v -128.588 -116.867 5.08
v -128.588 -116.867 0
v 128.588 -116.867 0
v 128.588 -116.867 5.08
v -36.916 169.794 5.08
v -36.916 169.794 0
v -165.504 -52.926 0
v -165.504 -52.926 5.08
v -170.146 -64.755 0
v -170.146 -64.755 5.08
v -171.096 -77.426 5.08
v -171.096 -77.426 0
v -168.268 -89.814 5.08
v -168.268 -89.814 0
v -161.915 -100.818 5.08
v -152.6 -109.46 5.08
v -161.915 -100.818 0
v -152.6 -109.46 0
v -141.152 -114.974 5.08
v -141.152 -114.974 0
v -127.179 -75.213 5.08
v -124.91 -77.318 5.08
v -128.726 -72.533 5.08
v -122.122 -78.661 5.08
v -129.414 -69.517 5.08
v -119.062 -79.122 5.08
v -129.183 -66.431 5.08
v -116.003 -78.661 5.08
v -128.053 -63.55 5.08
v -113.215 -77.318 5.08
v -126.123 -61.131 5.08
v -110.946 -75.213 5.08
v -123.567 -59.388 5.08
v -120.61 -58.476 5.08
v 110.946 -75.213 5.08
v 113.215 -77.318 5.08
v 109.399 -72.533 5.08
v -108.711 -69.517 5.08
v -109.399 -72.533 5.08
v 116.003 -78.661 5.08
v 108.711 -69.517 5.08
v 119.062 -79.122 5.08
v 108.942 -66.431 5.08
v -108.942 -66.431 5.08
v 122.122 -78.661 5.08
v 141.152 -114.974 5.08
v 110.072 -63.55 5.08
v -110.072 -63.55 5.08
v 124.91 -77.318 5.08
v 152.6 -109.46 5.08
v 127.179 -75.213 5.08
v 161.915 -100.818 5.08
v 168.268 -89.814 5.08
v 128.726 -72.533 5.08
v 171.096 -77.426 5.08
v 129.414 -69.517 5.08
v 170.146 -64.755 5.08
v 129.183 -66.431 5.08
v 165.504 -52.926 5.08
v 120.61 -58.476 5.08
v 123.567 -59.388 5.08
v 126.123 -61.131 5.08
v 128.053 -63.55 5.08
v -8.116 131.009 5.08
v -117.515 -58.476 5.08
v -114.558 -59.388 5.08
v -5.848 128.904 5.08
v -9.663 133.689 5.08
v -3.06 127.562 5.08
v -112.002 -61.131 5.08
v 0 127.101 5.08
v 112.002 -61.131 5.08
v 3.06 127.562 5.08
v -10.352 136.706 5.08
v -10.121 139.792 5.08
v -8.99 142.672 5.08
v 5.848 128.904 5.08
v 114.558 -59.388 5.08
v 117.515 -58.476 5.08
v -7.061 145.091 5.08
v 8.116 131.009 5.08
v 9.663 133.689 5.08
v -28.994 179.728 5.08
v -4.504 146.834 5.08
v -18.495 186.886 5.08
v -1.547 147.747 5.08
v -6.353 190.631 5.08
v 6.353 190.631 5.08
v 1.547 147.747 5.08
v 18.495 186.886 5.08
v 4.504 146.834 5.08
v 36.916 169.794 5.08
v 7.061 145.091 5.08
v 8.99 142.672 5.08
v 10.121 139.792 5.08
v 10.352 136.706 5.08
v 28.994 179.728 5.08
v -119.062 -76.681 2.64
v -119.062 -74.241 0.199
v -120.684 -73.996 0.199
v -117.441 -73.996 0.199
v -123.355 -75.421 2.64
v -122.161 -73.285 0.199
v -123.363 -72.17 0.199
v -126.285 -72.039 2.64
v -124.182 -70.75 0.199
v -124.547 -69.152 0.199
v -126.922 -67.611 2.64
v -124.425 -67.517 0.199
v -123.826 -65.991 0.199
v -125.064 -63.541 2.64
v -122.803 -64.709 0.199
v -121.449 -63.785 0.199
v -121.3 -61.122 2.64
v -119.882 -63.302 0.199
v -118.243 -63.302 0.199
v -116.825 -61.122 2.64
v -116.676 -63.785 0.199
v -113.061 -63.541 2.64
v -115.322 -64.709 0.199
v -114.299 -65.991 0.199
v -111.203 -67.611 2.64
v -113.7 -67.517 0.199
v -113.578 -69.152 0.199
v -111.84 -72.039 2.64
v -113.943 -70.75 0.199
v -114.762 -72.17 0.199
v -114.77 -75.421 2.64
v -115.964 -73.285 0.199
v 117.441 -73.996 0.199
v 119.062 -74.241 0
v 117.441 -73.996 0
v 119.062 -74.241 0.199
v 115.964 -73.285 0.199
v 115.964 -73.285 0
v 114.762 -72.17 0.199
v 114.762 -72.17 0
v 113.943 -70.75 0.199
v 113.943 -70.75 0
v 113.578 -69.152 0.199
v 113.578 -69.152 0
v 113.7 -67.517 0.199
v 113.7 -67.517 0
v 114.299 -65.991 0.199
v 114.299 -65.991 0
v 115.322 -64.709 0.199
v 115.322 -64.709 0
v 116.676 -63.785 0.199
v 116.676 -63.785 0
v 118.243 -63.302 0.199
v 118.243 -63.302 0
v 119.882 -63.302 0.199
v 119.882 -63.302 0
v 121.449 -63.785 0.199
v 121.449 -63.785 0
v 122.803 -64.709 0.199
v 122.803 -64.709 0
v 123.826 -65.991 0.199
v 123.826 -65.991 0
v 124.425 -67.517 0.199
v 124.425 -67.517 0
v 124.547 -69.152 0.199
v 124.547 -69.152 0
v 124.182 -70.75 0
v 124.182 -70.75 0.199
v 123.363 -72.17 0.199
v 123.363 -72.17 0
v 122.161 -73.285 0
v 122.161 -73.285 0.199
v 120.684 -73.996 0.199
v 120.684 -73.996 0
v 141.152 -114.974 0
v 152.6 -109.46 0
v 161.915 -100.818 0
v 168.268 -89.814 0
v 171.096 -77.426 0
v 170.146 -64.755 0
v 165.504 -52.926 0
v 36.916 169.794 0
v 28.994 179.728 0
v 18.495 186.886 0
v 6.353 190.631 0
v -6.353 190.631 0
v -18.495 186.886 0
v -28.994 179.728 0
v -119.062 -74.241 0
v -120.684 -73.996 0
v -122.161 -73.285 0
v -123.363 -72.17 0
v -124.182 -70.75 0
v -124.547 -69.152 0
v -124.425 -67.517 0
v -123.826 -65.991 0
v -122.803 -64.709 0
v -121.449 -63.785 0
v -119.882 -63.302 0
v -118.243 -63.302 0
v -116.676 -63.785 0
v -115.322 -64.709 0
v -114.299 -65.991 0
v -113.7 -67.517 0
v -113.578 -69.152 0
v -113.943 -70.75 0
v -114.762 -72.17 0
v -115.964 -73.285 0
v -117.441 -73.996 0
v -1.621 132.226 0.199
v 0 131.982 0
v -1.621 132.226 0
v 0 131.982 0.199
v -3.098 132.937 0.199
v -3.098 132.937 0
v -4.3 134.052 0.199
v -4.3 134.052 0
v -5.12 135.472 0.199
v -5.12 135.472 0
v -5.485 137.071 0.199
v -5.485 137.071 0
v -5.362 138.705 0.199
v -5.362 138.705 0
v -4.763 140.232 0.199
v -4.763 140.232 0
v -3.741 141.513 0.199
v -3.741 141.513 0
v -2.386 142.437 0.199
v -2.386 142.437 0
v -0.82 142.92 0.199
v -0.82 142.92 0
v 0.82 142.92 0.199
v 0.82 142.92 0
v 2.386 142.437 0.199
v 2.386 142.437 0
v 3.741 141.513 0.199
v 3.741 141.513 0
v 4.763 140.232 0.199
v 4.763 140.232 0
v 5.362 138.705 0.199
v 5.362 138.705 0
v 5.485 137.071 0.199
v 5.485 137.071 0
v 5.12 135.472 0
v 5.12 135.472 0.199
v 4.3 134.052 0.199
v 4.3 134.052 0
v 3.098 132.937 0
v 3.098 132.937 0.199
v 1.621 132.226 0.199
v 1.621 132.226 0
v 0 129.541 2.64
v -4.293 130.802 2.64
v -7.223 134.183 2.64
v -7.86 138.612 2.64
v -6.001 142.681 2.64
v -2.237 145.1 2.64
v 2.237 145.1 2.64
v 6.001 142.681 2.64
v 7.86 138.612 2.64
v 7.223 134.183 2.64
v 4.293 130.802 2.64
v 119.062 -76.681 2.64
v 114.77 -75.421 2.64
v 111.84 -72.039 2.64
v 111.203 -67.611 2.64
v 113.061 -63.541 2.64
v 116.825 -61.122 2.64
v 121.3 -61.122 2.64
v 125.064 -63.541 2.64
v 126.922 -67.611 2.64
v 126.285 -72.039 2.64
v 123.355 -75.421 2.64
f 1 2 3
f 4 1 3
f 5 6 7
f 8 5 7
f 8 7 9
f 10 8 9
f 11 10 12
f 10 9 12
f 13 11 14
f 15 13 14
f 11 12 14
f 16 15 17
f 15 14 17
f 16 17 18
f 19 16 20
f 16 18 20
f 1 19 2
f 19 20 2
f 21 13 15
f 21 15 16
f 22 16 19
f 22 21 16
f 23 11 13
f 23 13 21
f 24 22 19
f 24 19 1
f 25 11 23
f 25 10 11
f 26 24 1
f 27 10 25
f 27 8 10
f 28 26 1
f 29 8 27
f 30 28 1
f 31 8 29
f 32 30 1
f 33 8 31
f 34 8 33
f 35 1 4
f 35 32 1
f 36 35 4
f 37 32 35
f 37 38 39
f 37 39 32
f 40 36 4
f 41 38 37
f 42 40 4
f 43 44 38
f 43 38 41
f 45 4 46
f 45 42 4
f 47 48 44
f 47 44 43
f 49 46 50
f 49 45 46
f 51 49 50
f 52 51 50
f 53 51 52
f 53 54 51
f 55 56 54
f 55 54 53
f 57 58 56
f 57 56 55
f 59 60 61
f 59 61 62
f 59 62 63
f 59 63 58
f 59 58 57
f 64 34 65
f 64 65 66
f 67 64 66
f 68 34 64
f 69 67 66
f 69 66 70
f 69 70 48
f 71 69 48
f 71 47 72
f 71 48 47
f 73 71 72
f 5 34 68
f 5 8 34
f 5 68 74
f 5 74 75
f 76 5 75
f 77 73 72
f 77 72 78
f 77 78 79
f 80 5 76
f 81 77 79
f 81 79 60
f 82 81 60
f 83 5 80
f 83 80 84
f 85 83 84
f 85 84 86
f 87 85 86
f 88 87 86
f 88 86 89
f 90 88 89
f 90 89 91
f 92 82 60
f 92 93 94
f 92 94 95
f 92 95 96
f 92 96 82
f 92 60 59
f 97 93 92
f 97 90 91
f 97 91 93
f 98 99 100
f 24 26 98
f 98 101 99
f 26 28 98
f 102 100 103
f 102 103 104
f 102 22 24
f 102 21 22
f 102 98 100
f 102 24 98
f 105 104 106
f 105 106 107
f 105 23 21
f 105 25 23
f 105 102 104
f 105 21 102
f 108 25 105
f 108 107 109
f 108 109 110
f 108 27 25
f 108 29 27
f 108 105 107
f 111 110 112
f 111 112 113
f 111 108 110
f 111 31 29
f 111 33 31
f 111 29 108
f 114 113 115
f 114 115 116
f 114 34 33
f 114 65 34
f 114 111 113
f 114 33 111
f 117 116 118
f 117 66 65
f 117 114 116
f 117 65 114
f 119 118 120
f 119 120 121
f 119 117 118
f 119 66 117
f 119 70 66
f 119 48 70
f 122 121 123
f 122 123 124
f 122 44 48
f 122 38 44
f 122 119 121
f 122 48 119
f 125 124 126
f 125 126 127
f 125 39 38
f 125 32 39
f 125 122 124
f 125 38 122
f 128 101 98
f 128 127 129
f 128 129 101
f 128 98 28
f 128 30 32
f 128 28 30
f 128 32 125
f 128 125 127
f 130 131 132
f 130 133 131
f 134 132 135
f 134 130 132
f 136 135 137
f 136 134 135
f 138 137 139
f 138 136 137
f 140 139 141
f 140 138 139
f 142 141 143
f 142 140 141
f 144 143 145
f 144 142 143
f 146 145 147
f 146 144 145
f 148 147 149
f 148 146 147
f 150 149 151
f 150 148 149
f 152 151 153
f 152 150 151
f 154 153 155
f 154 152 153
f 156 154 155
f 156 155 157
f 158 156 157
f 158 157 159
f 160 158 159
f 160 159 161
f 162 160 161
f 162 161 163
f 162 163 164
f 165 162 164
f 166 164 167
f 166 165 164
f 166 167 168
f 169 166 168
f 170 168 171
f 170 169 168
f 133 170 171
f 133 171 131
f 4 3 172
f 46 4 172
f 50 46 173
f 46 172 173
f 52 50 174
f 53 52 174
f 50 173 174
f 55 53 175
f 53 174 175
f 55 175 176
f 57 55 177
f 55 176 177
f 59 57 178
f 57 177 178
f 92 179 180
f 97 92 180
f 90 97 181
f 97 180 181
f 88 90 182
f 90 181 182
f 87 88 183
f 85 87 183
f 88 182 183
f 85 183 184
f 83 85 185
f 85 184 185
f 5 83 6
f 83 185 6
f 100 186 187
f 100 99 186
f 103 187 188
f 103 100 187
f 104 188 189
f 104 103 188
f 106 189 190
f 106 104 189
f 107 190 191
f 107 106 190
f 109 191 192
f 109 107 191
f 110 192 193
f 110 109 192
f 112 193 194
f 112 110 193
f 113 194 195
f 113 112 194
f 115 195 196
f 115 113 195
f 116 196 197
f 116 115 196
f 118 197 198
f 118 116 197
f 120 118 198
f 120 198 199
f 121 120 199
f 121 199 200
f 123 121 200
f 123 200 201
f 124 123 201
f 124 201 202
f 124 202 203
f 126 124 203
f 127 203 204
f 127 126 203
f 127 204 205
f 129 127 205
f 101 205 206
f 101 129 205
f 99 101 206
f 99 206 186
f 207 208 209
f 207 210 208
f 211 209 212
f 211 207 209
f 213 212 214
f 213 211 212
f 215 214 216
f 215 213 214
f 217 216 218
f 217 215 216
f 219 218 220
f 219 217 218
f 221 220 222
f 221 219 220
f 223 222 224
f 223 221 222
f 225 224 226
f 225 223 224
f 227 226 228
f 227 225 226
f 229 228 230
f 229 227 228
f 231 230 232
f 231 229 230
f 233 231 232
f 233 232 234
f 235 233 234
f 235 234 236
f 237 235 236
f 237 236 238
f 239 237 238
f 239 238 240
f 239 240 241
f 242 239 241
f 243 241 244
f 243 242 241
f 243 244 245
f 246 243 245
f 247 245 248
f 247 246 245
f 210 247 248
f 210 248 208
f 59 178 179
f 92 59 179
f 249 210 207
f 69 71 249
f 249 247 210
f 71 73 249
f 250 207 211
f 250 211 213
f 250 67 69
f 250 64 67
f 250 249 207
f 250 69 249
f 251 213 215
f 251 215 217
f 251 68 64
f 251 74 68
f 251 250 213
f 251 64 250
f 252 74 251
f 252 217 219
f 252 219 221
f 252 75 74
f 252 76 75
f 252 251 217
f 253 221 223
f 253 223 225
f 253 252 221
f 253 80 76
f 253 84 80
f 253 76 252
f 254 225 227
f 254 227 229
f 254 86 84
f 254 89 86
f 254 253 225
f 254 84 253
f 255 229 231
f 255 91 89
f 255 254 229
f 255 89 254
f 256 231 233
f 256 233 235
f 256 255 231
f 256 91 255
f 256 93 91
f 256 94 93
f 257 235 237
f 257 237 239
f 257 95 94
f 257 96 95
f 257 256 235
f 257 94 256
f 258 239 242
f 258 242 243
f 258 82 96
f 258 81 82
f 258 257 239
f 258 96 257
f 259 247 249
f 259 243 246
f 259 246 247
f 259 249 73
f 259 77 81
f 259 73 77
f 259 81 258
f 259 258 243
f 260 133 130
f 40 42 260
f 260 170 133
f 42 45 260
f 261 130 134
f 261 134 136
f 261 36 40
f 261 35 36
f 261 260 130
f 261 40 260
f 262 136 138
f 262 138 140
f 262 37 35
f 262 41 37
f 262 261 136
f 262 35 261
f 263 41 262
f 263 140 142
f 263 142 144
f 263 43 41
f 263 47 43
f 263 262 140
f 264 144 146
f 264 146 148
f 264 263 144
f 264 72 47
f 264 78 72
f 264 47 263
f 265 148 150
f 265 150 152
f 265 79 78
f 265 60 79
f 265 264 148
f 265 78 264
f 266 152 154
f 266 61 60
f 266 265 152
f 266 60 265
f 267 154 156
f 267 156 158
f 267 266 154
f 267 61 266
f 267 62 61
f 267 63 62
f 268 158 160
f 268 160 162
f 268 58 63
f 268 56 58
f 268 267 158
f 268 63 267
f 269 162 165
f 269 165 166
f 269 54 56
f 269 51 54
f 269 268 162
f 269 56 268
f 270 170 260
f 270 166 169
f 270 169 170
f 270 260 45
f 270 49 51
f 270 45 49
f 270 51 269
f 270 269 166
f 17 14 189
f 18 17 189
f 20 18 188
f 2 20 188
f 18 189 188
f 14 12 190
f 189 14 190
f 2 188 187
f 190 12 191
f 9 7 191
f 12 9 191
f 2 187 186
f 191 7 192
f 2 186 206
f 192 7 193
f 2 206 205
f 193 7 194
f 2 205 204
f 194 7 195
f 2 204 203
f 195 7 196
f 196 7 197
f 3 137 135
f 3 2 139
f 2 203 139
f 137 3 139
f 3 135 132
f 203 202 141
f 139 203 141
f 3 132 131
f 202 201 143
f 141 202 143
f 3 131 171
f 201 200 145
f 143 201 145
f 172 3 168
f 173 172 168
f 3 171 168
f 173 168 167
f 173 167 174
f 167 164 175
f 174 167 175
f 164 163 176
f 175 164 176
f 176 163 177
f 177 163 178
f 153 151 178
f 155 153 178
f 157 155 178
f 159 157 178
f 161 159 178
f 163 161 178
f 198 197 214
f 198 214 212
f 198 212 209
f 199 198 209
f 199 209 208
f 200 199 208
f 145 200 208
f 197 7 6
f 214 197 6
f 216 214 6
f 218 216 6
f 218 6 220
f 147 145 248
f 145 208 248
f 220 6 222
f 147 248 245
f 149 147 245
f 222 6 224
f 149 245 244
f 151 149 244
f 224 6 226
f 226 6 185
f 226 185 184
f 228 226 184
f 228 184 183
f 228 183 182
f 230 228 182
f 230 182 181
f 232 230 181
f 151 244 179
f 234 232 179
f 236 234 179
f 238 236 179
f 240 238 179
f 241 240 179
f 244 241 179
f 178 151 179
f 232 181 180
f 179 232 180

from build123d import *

# Parameters (mm, degrees)
BOSS_EXTRUDE1_DEPTH                           = 5.08
CSK_FOR_M10_FLAT_HEAD_MACHINE_SCREW1_AT_COUNT = 2
CSK_FOR_M10_FLAT_HEAD_MACHINE_SCREW1_AT_PITCH = 238.125
CSK_FOR_M10_FLAT_HEAD_MACHINE_SCREW1_2_COUNT  = 2
CSK_FOR_M10_FLAT_HEAD_MACHINE_SCREW1_2_PITCH  = 238.125


with BuildPart() as part:
    # Sketch1 → Boss-Extrude1 (new body)
    with BuildSketch(Plane.XY):
        with BuildLine():
            Line((-128.5875, -116.86748613), (128.5875, -116.86748613))
            ThreePointArc((128.5875, -116.86748613), (165.503961865, -95.553756935), (165.503961865, -52.926298544))
            Line((165.503961865, -52.926298544), (36.916461865, 169.793784674))
            ThreePointArc((36.916461865, 169.793784674), (0, 191.10751387), (-36.916461865, 169.793784674))
            Line((-36.916461865, 169.793784674), (-165.503961865, -52.926298544))
            ThreePointArc((-165.503961865, -52.926298544), (-165.503961865, -95.553756935), (-128.5875, -116.86748613))
        make_face()
    extrude(amount=BOSS_EXTRUDE1_DEPTH)

    # Sketch3 → CSK for M10 Flat Head Machine Screw1 (revolve, cut)
    with BuildSketch(Plane(origin=(0, 137.481532851, 5.08), x_dir=(0, -1, 0), z_dir=(1, 0, 0))):
        Polygon((0, 0), (0, 5.08), (5.5, 5.08), (5.5, 4.881), (10.381, 0), align=None)
    csk_for_m10_flat_head_machine_screw1 = revolve(axis=Axis((0, 137.481532851, 11.43), (0, 0, -1)), mode=Mode.SUBTRACT)

    # CSK for M10 Flat Head Machine Screw1 at: CSK for M10 Flat Head Machine Screw1 ×2
    with Locations(*[Vector(-0.5, -0.8660254037844387, 0) * (i * CSK_FOR_M10_FLAT_HEAD_MACHINE_SCREW1_AT_PITCH) for i in range(1, CSK_FOR_M10_FLAT_HEAD_MACHINE_SCREW1_AT_COUNT)]):
        add(csk_for_m10_flat_head_machine_screw1, mode=Mode.SUBTRACT)

    # CSK for M10 Flat Head Machine Screw1 2: CSK for M10 Flat Head Machine Screw1 ×2
    with Locations(*[Vector(0.5, -0.8660254037844387, 0) * (i * CSK_FOR_M10_FLAT_HEAD_MACHINE_SCREW1_2_PITCH) for i in range(1, CSK_FOR_M10_FLAT_HEAD_MACHINE_SCREW1_2_COUNT)]):
        add(csk_for_m10_flat_head_machine_screw1, mode=Mode.SUBTRACT)


solid = part.part
